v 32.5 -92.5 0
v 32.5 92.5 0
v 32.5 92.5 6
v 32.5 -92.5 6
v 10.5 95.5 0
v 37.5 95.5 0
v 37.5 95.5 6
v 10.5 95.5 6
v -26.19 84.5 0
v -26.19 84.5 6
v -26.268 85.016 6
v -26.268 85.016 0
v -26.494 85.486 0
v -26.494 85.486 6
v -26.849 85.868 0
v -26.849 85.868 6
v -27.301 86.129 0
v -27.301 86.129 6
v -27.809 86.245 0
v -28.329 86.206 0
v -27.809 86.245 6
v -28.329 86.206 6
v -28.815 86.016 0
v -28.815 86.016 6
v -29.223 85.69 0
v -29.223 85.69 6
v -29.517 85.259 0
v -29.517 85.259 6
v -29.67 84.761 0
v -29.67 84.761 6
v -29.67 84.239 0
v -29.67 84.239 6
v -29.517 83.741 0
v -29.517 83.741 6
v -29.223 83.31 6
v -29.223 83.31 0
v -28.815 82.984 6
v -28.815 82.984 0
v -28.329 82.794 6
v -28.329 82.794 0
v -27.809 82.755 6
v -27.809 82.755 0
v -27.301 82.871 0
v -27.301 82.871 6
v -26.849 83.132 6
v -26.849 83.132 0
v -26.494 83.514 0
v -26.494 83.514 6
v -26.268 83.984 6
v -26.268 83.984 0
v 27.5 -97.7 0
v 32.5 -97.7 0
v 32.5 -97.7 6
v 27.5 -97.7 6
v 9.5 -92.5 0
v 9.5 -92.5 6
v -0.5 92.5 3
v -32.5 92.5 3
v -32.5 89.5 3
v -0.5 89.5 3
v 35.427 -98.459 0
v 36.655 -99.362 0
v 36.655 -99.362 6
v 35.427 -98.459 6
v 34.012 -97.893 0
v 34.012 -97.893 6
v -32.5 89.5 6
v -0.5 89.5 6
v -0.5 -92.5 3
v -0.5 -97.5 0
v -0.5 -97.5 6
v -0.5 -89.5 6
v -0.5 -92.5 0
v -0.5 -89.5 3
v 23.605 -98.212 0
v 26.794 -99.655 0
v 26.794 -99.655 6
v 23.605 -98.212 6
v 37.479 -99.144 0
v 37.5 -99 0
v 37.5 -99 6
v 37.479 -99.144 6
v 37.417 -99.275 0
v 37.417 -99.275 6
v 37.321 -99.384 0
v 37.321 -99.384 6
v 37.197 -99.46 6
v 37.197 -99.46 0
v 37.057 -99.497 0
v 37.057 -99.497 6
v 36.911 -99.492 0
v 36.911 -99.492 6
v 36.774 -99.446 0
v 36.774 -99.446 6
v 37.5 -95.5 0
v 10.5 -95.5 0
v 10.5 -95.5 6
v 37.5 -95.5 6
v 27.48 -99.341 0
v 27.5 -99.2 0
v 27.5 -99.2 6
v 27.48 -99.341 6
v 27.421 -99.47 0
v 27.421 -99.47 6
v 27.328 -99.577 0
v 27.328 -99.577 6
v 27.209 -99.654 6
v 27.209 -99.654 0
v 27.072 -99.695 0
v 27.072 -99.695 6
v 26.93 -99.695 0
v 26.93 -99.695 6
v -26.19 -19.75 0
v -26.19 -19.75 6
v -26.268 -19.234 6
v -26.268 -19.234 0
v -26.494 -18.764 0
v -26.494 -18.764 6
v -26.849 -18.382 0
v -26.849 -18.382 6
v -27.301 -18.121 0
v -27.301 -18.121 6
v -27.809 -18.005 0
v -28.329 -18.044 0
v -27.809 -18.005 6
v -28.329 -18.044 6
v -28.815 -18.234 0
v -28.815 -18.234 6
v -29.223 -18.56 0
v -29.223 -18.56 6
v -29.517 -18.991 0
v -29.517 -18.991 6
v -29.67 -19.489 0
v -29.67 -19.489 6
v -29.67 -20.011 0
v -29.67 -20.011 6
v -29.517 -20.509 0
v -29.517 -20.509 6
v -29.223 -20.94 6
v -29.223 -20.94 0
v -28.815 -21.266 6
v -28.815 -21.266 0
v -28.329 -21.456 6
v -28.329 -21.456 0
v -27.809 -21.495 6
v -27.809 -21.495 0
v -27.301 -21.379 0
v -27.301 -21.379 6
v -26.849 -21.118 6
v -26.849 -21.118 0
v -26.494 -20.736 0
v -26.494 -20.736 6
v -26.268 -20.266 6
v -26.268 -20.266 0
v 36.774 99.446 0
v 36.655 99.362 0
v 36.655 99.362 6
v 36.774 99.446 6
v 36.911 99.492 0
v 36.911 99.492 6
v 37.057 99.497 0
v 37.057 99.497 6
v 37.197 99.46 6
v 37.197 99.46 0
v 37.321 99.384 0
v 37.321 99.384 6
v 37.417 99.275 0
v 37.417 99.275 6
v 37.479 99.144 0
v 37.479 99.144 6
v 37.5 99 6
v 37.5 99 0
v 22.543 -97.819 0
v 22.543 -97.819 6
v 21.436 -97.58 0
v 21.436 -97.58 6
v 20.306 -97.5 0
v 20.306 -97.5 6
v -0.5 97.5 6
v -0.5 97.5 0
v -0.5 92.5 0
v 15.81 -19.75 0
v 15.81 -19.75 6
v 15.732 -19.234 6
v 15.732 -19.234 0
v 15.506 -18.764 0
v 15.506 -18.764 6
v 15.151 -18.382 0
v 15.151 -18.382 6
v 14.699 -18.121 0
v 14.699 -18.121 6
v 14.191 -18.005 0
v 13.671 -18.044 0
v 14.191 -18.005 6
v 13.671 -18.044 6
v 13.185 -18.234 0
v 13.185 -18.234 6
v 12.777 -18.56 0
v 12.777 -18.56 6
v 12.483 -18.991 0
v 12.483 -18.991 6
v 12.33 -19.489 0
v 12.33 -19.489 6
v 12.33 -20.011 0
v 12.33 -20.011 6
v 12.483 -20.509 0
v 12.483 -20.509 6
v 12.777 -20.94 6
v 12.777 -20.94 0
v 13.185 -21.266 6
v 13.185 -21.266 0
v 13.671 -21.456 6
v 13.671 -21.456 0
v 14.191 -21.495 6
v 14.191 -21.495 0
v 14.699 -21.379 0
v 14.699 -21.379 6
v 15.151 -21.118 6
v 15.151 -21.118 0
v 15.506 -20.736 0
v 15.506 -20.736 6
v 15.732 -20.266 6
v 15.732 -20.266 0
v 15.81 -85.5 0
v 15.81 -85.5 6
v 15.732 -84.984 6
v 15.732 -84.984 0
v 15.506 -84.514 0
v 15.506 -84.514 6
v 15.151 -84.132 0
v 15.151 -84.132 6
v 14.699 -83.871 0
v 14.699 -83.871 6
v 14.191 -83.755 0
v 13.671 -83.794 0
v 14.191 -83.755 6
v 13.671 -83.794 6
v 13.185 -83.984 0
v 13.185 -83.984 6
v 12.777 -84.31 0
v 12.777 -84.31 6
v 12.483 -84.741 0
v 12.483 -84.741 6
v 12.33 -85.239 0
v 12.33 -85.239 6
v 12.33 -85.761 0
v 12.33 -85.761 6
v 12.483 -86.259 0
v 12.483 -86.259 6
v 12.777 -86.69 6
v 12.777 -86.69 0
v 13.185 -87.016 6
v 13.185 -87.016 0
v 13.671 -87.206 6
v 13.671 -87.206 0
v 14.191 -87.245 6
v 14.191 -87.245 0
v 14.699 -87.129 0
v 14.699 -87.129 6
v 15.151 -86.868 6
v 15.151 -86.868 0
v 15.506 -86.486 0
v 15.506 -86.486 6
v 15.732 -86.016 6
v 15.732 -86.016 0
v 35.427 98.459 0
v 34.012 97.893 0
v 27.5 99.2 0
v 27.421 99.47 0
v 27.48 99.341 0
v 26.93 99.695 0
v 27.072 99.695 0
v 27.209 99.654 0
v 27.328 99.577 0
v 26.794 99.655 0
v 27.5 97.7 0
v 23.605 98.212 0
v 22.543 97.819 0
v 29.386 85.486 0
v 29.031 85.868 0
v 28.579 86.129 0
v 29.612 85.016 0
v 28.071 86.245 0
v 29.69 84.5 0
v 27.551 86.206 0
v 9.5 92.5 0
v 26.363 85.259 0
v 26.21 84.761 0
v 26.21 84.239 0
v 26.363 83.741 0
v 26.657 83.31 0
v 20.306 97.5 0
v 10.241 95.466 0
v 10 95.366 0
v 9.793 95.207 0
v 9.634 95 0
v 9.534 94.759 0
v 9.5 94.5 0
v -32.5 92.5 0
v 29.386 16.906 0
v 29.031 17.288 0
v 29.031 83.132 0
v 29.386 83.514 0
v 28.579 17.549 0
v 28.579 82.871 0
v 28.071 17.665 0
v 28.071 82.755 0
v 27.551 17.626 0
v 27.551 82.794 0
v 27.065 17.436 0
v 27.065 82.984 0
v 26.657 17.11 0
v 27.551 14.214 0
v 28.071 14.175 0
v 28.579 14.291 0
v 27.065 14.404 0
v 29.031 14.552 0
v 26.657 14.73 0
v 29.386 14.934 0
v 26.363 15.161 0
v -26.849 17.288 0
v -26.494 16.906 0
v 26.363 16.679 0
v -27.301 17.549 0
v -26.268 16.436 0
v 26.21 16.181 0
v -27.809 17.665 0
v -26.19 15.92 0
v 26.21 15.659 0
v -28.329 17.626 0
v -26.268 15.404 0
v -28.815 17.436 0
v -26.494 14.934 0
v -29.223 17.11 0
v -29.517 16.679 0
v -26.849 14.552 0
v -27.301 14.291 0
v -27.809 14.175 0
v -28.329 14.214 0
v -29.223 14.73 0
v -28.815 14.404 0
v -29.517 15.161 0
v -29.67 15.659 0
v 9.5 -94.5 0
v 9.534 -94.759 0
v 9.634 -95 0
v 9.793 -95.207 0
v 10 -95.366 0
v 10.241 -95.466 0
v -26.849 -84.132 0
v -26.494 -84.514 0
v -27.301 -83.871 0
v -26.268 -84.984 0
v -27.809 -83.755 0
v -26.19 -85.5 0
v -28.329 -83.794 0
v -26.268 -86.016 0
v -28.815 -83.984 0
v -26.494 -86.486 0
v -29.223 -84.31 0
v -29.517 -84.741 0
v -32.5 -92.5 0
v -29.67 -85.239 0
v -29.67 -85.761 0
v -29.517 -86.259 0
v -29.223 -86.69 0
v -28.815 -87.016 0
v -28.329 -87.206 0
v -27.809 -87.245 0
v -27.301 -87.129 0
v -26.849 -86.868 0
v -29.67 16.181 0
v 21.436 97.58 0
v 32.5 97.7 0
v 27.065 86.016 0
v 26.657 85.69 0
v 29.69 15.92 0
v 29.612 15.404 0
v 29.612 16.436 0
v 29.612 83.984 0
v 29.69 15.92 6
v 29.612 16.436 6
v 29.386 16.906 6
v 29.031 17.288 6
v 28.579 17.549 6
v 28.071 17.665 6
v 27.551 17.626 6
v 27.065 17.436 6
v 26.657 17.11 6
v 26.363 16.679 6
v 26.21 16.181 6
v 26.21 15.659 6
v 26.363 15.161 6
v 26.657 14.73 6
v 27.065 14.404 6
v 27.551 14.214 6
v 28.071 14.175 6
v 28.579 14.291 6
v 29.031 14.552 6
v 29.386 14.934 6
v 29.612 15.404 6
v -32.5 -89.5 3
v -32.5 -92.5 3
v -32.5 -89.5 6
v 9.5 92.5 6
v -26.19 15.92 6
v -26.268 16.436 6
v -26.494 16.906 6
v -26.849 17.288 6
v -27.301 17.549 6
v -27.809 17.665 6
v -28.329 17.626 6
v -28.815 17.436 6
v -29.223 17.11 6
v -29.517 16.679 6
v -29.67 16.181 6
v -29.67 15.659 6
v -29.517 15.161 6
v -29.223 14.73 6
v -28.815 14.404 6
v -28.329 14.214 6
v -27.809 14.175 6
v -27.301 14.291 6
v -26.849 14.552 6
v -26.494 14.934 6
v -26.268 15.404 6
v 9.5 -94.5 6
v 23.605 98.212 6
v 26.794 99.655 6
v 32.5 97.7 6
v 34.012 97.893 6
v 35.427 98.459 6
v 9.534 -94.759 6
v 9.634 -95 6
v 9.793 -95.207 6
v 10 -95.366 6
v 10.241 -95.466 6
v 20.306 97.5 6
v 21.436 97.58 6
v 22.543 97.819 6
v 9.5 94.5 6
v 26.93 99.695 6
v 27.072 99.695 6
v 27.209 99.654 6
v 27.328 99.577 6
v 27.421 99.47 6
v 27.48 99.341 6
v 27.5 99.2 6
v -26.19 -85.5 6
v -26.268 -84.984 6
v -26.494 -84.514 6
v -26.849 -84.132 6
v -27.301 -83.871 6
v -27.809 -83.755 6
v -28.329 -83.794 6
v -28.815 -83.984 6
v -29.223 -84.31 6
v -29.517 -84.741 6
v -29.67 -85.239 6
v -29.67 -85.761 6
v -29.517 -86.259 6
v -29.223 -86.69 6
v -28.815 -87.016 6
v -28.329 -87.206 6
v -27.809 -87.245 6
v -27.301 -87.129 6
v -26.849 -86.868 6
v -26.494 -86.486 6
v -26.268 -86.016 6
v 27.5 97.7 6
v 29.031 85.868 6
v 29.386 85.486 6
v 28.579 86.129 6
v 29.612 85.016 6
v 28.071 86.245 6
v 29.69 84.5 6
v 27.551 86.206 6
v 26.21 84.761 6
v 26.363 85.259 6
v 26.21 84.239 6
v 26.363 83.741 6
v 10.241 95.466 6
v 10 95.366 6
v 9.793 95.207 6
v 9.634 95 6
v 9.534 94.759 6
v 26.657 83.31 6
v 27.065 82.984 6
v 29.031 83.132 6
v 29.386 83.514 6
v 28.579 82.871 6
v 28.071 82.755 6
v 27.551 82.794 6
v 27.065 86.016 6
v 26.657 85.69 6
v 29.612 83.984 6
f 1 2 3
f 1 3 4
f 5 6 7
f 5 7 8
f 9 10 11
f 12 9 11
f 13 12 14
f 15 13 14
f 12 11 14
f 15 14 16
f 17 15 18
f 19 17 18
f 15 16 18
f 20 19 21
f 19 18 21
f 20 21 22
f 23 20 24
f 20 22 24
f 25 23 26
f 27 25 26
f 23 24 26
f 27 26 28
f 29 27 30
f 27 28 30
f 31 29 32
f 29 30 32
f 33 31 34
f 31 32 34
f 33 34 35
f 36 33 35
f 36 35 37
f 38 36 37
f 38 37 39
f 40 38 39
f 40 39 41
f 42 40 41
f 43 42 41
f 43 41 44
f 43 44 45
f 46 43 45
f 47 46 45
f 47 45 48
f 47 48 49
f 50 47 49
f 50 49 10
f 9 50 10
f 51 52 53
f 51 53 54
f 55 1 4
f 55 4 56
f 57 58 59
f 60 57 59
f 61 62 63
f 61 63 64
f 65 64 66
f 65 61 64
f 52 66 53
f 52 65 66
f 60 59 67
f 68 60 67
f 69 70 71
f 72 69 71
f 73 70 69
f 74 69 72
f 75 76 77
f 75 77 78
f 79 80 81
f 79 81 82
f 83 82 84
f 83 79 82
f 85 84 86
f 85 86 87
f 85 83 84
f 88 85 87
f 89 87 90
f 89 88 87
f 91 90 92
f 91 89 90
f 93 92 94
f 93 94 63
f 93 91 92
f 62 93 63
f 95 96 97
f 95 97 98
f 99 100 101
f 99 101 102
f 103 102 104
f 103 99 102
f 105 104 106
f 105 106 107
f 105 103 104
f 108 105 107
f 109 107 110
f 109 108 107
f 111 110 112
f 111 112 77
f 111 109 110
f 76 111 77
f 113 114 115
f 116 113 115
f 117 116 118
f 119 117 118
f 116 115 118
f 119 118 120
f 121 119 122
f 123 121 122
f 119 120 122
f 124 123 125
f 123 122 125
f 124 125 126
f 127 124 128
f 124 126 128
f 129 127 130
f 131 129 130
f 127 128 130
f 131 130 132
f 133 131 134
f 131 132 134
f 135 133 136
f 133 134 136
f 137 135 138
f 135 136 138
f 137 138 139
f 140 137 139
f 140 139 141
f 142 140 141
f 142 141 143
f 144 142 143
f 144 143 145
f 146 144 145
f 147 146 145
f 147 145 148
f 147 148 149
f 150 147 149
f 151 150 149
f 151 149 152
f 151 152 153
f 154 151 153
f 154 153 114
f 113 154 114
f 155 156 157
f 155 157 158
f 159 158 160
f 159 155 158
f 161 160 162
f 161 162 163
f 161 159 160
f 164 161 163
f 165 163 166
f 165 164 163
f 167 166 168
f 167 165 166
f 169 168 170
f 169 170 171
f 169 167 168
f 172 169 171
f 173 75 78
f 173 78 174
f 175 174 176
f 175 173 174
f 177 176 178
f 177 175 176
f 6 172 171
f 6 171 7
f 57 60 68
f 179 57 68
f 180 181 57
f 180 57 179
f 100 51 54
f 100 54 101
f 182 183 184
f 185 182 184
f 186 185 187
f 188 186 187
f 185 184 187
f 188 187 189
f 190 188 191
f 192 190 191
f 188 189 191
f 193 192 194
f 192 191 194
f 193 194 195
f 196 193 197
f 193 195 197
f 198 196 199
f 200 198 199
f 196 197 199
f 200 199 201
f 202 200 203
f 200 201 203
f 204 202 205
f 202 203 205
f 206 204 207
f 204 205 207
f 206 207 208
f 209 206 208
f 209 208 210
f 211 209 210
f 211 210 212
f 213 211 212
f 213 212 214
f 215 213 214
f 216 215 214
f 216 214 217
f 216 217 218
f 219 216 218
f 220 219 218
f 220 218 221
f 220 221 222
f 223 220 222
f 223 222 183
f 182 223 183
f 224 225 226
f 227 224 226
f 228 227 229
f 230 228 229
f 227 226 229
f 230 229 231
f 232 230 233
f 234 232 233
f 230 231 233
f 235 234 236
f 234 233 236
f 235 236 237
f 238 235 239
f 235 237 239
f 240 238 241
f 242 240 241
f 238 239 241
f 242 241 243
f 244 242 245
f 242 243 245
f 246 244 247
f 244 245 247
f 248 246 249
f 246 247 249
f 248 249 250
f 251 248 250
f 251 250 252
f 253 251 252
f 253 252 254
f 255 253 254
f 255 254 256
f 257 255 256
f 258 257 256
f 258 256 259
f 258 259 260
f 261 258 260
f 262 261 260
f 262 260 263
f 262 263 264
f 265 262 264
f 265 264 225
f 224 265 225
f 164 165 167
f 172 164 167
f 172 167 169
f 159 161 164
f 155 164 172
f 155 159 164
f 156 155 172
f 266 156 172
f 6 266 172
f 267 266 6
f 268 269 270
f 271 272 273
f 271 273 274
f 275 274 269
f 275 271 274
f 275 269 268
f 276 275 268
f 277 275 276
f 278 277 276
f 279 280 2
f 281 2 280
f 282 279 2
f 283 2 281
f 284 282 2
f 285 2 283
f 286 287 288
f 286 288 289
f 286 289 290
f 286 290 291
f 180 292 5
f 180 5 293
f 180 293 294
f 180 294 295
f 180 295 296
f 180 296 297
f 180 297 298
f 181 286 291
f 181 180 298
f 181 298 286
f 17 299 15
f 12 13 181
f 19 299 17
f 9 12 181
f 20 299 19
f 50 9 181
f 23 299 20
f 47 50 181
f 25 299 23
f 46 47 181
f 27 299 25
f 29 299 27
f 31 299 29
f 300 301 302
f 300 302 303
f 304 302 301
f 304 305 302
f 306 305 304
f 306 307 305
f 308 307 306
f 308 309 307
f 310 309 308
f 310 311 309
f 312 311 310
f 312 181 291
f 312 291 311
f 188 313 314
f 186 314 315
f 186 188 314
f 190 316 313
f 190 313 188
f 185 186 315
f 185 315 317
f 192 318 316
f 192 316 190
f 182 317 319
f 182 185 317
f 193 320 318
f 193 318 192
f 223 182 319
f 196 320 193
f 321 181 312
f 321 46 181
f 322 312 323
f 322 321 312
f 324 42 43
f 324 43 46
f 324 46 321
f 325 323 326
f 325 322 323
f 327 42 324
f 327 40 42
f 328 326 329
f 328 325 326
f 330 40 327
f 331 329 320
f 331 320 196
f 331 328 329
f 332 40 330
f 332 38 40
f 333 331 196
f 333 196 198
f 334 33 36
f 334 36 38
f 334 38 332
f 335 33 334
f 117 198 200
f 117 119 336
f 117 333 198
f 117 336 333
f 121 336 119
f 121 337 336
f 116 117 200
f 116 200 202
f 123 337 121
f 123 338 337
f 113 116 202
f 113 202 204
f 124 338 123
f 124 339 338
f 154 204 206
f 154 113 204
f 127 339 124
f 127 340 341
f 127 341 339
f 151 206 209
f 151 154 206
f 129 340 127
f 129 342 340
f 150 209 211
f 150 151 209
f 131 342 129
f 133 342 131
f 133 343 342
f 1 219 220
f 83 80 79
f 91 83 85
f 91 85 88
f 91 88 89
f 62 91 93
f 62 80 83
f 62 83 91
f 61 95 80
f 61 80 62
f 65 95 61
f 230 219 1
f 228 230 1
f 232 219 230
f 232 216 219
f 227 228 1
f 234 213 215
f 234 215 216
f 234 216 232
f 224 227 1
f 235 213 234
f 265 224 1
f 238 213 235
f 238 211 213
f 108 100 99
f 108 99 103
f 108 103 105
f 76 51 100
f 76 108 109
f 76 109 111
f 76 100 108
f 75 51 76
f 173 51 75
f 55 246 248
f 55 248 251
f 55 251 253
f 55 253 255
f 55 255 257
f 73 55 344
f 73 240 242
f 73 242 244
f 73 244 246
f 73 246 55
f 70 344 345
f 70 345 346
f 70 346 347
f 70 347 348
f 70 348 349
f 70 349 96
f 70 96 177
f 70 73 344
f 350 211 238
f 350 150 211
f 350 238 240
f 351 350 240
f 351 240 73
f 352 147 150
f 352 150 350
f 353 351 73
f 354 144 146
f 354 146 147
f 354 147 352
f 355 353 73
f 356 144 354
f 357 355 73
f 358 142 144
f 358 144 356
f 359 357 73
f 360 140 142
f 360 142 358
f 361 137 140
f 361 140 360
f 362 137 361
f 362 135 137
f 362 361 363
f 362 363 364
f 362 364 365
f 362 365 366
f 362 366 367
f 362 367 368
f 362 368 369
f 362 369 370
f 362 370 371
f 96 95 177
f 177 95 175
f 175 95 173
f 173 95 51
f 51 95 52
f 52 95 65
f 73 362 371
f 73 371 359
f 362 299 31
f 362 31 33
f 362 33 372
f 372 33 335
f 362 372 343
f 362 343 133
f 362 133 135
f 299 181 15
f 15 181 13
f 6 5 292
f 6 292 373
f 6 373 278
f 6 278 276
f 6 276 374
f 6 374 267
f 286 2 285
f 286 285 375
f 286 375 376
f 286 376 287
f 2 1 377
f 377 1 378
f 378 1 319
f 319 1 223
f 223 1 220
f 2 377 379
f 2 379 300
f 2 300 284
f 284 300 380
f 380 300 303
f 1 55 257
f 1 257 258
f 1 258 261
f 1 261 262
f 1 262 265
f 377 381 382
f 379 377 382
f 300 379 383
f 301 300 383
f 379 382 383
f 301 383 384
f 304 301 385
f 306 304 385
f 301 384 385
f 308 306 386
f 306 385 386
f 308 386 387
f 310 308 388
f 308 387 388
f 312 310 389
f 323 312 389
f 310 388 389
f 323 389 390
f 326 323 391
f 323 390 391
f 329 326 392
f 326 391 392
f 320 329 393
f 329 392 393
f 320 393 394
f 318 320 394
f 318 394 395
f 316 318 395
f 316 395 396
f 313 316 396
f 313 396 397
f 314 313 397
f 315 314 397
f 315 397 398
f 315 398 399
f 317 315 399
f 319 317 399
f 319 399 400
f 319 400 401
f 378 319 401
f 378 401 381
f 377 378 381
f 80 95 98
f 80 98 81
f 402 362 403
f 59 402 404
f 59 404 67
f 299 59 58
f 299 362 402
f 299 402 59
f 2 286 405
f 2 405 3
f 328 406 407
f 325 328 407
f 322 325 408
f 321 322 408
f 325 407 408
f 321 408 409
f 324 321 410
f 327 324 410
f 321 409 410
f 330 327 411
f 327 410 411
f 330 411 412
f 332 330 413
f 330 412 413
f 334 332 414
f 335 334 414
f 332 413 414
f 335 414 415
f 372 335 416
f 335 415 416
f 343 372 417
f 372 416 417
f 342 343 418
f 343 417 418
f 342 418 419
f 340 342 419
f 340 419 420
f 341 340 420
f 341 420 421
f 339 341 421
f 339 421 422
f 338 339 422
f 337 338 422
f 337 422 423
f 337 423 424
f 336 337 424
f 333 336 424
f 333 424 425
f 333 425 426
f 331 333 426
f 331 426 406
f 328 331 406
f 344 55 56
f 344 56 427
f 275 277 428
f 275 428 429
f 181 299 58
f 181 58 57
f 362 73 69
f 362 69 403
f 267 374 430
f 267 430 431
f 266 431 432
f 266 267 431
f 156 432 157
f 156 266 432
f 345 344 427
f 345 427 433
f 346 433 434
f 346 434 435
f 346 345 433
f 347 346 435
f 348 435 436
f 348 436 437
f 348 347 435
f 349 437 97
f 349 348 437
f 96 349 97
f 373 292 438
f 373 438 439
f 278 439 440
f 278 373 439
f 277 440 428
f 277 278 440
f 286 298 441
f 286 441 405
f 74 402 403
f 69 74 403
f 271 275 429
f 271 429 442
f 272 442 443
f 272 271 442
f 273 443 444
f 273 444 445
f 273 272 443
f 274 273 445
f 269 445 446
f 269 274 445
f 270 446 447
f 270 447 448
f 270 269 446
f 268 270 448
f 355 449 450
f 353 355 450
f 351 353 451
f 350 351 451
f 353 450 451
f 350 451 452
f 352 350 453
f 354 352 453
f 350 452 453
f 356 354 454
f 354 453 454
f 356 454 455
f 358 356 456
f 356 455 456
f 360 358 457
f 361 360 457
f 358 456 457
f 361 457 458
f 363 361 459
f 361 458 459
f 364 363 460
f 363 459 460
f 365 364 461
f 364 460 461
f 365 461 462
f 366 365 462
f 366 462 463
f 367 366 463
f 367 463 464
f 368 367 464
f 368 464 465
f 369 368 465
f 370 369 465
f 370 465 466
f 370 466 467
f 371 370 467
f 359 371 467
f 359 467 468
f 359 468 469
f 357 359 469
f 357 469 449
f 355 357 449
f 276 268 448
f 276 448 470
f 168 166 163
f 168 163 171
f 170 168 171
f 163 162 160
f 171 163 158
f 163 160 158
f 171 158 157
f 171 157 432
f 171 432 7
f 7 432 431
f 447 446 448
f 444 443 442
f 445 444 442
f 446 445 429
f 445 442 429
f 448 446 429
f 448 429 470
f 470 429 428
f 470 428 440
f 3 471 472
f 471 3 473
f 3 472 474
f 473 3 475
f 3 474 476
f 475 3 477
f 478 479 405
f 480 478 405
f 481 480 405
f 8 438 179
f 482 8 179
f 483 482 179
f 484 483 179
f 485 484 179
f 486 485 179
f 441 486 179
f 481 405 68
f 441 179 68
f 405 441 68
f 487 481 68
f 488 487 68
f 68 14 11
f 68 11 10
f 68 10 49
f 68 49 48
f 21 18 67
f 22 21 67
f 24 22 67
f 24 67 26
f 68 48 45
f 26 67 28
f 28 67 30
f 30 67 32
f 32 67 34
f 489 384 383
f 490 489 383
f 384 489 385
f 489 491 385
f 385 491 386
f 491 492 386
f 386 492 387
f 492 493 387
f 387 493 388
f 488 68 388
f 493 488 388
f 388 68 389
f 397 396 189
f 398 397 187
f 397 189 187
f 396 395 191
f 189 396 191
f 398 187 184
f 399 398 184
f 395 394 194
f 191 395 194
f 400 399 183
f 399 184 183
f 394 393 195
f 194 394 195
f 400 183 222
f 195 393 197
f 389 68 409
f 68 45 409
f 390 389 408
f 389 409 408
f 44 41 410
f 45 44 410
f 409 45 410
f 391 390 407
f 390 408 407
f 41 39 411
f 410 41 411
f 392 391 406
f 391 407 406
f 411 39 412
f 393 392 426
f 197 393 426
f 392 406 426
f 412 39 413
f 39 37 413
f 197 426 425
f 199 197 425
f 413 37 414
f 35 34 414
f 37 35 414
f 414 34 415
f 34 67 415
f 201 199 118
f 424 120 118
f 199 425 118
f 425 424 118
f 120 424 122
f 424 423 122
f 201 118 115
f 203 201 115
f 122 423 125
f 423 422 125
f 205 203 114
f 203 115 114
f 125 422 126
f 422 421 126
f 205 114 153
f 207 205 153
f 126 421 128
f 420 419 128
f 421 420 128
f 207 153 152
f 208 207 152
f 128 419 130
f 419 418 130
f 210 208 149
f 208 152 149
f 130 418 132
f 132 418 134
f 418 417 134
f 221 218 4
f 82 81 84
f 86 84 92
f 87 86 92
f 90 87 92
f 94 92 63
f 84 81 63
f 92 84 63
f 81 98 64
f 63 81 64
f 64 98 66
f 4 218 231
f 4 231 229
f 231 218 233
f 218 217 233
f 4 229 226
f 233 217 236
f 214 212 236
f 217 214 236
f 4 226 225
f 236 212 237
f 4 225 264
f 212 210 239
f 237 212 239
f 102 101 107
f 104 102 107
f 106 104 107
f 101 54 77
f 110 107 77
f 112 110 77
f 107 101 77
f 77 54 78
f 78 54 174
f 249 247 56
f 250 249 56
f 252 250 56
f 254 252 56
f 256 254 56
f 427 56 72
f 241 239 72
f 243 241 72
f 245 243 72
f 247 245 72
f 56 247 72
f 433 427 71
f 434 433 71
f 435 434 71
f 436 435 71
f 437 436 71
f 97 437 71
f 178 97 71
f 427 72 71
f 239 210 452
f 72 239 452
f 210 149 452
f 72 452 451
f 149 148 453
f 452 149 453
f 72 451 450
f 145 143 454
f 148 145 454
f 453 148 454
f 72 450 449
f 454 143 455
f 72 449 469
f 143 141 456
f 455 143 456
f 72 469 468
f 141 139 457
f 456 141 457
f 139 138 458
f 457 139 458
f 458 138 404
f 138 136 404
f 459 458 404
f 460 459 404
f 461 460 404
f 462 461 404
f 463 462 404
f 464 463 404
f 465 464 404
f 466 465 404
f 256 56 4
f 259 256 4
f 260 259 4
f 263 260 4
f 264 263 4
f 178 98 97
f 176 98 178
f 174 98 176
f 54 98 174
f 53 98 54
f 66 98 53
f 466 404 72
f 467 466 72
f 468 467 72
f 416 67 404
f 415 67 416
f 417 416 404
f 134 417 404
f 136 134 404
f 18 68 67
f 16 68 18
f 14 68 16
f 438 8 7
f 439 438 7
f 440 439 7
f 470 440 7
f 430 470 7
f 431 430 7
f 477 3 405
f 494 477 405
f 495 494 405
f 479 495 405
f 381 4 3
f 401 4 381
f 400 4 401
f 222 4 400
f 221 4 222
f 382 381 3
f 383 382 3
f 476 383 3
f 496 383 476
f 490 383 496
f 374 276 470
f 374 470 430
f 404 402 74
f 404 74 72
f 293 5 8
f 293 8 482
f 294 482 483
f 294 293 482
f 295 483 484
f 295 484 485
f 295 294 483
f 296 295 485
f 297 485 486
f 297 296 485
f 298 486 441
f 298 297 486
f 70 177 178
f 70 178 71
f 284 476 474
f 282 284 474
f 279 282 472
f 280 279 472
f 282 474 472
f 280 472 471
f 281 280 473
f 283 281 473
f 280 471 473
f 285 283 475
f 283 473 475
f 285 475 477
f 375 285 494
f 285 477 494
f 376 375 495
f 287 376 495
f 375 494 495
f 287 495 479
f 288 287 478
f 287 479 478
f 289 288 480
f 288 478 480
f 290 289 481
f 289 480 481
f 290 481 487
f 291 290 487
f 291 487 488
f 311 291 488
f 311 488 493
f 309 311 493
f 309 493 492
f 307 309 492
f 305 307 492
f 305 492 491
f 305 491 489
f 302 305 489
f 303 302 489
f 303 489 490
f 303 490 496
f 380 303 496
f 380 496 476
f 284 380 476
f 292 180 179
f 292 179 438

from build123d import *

# Parameters (mm, degrees)
BOSS_EXTRUDE1_DEPTH = 6
SKETCH4_W           = 3
SKETCH4_H           = 3
CUT_EXTRUDE2_DEPTH  = 32
SKETCH5_R           = 1.75
CUT_EXTRUDE3_DEPTH  = 10


with BuildPart() as part:
    # Sketch1 → Boss-Extrude1 (new body)
    with BuildSketch(Plane(origin=(0, 0, 0), x_dir=(0, 1, 0), z_dir=(0, 0, 1))):
        with BuildLine():
            Line((-92.5, -9.5), (-94.5, -9.5))
            ThreePointArc((-94.5, -9.5), (-95.207106781, -9.792893219), (-95.5, -10.5))
            Line((-95.5, -10.5), (-95.5, -27.5))
            Line((-95.5, -27.5), (-95.5, -37.5))
            Line((-95.5, -37.5), (-99, -37.5))
            ThreePointArc((-99, -37.5), (-99.459572515, -37.196959649), (-99.362068966, -36.655172414))
            ThreePointArc((-99.362068966, -36.655172414), (-98.130927937, -34.737628825), (-97.7, -32.5))
            Line((-97.7, -32.5), (-97.7, -27.5))
            Line((-97.7, -27.5), (-99.2, -27.5))
            ThreePointArc((-99.2, -27.5), (-99.620181053, -27.271012699), (-99.655497604, -26.793791532))
            Line((-99.655497604, -26.793791532), (-98.212038328, -23.6053083))
            ThreePointArc((-98.212038328, -23.6053083), (-97.680035378, -21.993620083), (-97.5, -20.305972812))
            Line((-97.5, -20.305972812), (-97.5, -9.5))
            Line((-97.5, -9.5), (-97.5, 0.5))
            Line((-97.5, 0.5), (-92.5, 0.5))
            Line((-92.5, 0.5), (-92.5, 32.5))
            Line((-92.5, 32.5), (92.5, 32.5))
            Line((92.5, 32.5), (92.5, 0.5))
            Line((92.5, 0.5), (97.5, 0.5))
            Line((97.5, 0.5), (97.5, -9.5))
            Line((97.5, -9.5), (97.5, -20.305972812))
            ThreePointArc((97.5, -20.305972812), (97.680035378, -21.993620083), (98.212038328, -23.6053083))
            Line((98.212038328, -23.6053083), (99.655497604, -26.793791532))
            ThreePointArc((99.655497604, -26.793791532), (99.620181053, -27.271012699), (99.2, -27.5))
            Line((99.2, -27.5), (97.7, -27.5))
            Line((97.7, -27.5), (97.7, -32.5))
            ThreePointArc((97.7, -32.5), (98.130927937, -34.737628825), (99.362068966, -36.655172414))
            ThreePointArc((99.362068966, -36.655172414), (99.459572515, -37.196959649), (99, -37.5))
            Line((99, -37.5), (95.5, -37.5))
            Line((95.5, -37.5), (95.5, -27.5))
            Line((95.5, -27.5), (95.5, -10.5))
            ThreePointArc((95.5, -10.5), (95.207106781, -9.792893219), (94.5, -9.5))
            Line((94.5, -9.5), (92.5, -9.5))
            Line((92.5, -9.5), (92.5, -32.5))
            Line((92.5, -32.5), (-92.5, -32.5))
            Line((-92.5, -32.5), (-92.5, -9.5))
        make_face()
    extrude(amount=BOSS_EXTRUDE1_DEPTH)

    # Sketch4 → Cut-Extrude2 (cut)
    with BuildSketch(Plane(origin=(-32.5, 0, 0), x_dir=(0, -1, 0), z_dir=(-1, 0, 0))):
        with Locations((-91, 4.5)):
            Rectangle(SKETCH4_W, SKETCH4_H)
        with Locations((91, 4.5)):
            Rectangle(SKETCH4_W, SKETCH4_H)
    extrude(amount=-CUT_EXTRUDE2_DEPTH, mode=Mode.SUBTRACT)

    # Sketch5 → Cut-Extrude3 (cut)
    with BuildSketch(Plane.XY.offset(6)):
        with Locations((-27.94, 84.5)):
            Circle(SKETCH5_R)
        with Locations((-27.94, 15.92)):
            Circle(SKETCH5_R)
        with Locations((27.94, 15.92)):
            Circle(SKETCH5_R)
        with Locations((27.94, 84.5)):
            Circle(SKETCH5_R)
        with Locations((-27.94, -19.75)):
            Circle(SKETCH5_R)
        with Locations((-27.94, -85.5)):
            Circle(SKETCH5_R)
        with Locations((14.06, -85.5)):
            Circle(SKETCH5_R)
        with Locations((14.06, -19.75)):
            Circle(SKETCH5_R)
    extrude(amount=-CUT_EXTRUDE3_DEPTH, mode=Mode.SUBTRACT)


solid = part.part
